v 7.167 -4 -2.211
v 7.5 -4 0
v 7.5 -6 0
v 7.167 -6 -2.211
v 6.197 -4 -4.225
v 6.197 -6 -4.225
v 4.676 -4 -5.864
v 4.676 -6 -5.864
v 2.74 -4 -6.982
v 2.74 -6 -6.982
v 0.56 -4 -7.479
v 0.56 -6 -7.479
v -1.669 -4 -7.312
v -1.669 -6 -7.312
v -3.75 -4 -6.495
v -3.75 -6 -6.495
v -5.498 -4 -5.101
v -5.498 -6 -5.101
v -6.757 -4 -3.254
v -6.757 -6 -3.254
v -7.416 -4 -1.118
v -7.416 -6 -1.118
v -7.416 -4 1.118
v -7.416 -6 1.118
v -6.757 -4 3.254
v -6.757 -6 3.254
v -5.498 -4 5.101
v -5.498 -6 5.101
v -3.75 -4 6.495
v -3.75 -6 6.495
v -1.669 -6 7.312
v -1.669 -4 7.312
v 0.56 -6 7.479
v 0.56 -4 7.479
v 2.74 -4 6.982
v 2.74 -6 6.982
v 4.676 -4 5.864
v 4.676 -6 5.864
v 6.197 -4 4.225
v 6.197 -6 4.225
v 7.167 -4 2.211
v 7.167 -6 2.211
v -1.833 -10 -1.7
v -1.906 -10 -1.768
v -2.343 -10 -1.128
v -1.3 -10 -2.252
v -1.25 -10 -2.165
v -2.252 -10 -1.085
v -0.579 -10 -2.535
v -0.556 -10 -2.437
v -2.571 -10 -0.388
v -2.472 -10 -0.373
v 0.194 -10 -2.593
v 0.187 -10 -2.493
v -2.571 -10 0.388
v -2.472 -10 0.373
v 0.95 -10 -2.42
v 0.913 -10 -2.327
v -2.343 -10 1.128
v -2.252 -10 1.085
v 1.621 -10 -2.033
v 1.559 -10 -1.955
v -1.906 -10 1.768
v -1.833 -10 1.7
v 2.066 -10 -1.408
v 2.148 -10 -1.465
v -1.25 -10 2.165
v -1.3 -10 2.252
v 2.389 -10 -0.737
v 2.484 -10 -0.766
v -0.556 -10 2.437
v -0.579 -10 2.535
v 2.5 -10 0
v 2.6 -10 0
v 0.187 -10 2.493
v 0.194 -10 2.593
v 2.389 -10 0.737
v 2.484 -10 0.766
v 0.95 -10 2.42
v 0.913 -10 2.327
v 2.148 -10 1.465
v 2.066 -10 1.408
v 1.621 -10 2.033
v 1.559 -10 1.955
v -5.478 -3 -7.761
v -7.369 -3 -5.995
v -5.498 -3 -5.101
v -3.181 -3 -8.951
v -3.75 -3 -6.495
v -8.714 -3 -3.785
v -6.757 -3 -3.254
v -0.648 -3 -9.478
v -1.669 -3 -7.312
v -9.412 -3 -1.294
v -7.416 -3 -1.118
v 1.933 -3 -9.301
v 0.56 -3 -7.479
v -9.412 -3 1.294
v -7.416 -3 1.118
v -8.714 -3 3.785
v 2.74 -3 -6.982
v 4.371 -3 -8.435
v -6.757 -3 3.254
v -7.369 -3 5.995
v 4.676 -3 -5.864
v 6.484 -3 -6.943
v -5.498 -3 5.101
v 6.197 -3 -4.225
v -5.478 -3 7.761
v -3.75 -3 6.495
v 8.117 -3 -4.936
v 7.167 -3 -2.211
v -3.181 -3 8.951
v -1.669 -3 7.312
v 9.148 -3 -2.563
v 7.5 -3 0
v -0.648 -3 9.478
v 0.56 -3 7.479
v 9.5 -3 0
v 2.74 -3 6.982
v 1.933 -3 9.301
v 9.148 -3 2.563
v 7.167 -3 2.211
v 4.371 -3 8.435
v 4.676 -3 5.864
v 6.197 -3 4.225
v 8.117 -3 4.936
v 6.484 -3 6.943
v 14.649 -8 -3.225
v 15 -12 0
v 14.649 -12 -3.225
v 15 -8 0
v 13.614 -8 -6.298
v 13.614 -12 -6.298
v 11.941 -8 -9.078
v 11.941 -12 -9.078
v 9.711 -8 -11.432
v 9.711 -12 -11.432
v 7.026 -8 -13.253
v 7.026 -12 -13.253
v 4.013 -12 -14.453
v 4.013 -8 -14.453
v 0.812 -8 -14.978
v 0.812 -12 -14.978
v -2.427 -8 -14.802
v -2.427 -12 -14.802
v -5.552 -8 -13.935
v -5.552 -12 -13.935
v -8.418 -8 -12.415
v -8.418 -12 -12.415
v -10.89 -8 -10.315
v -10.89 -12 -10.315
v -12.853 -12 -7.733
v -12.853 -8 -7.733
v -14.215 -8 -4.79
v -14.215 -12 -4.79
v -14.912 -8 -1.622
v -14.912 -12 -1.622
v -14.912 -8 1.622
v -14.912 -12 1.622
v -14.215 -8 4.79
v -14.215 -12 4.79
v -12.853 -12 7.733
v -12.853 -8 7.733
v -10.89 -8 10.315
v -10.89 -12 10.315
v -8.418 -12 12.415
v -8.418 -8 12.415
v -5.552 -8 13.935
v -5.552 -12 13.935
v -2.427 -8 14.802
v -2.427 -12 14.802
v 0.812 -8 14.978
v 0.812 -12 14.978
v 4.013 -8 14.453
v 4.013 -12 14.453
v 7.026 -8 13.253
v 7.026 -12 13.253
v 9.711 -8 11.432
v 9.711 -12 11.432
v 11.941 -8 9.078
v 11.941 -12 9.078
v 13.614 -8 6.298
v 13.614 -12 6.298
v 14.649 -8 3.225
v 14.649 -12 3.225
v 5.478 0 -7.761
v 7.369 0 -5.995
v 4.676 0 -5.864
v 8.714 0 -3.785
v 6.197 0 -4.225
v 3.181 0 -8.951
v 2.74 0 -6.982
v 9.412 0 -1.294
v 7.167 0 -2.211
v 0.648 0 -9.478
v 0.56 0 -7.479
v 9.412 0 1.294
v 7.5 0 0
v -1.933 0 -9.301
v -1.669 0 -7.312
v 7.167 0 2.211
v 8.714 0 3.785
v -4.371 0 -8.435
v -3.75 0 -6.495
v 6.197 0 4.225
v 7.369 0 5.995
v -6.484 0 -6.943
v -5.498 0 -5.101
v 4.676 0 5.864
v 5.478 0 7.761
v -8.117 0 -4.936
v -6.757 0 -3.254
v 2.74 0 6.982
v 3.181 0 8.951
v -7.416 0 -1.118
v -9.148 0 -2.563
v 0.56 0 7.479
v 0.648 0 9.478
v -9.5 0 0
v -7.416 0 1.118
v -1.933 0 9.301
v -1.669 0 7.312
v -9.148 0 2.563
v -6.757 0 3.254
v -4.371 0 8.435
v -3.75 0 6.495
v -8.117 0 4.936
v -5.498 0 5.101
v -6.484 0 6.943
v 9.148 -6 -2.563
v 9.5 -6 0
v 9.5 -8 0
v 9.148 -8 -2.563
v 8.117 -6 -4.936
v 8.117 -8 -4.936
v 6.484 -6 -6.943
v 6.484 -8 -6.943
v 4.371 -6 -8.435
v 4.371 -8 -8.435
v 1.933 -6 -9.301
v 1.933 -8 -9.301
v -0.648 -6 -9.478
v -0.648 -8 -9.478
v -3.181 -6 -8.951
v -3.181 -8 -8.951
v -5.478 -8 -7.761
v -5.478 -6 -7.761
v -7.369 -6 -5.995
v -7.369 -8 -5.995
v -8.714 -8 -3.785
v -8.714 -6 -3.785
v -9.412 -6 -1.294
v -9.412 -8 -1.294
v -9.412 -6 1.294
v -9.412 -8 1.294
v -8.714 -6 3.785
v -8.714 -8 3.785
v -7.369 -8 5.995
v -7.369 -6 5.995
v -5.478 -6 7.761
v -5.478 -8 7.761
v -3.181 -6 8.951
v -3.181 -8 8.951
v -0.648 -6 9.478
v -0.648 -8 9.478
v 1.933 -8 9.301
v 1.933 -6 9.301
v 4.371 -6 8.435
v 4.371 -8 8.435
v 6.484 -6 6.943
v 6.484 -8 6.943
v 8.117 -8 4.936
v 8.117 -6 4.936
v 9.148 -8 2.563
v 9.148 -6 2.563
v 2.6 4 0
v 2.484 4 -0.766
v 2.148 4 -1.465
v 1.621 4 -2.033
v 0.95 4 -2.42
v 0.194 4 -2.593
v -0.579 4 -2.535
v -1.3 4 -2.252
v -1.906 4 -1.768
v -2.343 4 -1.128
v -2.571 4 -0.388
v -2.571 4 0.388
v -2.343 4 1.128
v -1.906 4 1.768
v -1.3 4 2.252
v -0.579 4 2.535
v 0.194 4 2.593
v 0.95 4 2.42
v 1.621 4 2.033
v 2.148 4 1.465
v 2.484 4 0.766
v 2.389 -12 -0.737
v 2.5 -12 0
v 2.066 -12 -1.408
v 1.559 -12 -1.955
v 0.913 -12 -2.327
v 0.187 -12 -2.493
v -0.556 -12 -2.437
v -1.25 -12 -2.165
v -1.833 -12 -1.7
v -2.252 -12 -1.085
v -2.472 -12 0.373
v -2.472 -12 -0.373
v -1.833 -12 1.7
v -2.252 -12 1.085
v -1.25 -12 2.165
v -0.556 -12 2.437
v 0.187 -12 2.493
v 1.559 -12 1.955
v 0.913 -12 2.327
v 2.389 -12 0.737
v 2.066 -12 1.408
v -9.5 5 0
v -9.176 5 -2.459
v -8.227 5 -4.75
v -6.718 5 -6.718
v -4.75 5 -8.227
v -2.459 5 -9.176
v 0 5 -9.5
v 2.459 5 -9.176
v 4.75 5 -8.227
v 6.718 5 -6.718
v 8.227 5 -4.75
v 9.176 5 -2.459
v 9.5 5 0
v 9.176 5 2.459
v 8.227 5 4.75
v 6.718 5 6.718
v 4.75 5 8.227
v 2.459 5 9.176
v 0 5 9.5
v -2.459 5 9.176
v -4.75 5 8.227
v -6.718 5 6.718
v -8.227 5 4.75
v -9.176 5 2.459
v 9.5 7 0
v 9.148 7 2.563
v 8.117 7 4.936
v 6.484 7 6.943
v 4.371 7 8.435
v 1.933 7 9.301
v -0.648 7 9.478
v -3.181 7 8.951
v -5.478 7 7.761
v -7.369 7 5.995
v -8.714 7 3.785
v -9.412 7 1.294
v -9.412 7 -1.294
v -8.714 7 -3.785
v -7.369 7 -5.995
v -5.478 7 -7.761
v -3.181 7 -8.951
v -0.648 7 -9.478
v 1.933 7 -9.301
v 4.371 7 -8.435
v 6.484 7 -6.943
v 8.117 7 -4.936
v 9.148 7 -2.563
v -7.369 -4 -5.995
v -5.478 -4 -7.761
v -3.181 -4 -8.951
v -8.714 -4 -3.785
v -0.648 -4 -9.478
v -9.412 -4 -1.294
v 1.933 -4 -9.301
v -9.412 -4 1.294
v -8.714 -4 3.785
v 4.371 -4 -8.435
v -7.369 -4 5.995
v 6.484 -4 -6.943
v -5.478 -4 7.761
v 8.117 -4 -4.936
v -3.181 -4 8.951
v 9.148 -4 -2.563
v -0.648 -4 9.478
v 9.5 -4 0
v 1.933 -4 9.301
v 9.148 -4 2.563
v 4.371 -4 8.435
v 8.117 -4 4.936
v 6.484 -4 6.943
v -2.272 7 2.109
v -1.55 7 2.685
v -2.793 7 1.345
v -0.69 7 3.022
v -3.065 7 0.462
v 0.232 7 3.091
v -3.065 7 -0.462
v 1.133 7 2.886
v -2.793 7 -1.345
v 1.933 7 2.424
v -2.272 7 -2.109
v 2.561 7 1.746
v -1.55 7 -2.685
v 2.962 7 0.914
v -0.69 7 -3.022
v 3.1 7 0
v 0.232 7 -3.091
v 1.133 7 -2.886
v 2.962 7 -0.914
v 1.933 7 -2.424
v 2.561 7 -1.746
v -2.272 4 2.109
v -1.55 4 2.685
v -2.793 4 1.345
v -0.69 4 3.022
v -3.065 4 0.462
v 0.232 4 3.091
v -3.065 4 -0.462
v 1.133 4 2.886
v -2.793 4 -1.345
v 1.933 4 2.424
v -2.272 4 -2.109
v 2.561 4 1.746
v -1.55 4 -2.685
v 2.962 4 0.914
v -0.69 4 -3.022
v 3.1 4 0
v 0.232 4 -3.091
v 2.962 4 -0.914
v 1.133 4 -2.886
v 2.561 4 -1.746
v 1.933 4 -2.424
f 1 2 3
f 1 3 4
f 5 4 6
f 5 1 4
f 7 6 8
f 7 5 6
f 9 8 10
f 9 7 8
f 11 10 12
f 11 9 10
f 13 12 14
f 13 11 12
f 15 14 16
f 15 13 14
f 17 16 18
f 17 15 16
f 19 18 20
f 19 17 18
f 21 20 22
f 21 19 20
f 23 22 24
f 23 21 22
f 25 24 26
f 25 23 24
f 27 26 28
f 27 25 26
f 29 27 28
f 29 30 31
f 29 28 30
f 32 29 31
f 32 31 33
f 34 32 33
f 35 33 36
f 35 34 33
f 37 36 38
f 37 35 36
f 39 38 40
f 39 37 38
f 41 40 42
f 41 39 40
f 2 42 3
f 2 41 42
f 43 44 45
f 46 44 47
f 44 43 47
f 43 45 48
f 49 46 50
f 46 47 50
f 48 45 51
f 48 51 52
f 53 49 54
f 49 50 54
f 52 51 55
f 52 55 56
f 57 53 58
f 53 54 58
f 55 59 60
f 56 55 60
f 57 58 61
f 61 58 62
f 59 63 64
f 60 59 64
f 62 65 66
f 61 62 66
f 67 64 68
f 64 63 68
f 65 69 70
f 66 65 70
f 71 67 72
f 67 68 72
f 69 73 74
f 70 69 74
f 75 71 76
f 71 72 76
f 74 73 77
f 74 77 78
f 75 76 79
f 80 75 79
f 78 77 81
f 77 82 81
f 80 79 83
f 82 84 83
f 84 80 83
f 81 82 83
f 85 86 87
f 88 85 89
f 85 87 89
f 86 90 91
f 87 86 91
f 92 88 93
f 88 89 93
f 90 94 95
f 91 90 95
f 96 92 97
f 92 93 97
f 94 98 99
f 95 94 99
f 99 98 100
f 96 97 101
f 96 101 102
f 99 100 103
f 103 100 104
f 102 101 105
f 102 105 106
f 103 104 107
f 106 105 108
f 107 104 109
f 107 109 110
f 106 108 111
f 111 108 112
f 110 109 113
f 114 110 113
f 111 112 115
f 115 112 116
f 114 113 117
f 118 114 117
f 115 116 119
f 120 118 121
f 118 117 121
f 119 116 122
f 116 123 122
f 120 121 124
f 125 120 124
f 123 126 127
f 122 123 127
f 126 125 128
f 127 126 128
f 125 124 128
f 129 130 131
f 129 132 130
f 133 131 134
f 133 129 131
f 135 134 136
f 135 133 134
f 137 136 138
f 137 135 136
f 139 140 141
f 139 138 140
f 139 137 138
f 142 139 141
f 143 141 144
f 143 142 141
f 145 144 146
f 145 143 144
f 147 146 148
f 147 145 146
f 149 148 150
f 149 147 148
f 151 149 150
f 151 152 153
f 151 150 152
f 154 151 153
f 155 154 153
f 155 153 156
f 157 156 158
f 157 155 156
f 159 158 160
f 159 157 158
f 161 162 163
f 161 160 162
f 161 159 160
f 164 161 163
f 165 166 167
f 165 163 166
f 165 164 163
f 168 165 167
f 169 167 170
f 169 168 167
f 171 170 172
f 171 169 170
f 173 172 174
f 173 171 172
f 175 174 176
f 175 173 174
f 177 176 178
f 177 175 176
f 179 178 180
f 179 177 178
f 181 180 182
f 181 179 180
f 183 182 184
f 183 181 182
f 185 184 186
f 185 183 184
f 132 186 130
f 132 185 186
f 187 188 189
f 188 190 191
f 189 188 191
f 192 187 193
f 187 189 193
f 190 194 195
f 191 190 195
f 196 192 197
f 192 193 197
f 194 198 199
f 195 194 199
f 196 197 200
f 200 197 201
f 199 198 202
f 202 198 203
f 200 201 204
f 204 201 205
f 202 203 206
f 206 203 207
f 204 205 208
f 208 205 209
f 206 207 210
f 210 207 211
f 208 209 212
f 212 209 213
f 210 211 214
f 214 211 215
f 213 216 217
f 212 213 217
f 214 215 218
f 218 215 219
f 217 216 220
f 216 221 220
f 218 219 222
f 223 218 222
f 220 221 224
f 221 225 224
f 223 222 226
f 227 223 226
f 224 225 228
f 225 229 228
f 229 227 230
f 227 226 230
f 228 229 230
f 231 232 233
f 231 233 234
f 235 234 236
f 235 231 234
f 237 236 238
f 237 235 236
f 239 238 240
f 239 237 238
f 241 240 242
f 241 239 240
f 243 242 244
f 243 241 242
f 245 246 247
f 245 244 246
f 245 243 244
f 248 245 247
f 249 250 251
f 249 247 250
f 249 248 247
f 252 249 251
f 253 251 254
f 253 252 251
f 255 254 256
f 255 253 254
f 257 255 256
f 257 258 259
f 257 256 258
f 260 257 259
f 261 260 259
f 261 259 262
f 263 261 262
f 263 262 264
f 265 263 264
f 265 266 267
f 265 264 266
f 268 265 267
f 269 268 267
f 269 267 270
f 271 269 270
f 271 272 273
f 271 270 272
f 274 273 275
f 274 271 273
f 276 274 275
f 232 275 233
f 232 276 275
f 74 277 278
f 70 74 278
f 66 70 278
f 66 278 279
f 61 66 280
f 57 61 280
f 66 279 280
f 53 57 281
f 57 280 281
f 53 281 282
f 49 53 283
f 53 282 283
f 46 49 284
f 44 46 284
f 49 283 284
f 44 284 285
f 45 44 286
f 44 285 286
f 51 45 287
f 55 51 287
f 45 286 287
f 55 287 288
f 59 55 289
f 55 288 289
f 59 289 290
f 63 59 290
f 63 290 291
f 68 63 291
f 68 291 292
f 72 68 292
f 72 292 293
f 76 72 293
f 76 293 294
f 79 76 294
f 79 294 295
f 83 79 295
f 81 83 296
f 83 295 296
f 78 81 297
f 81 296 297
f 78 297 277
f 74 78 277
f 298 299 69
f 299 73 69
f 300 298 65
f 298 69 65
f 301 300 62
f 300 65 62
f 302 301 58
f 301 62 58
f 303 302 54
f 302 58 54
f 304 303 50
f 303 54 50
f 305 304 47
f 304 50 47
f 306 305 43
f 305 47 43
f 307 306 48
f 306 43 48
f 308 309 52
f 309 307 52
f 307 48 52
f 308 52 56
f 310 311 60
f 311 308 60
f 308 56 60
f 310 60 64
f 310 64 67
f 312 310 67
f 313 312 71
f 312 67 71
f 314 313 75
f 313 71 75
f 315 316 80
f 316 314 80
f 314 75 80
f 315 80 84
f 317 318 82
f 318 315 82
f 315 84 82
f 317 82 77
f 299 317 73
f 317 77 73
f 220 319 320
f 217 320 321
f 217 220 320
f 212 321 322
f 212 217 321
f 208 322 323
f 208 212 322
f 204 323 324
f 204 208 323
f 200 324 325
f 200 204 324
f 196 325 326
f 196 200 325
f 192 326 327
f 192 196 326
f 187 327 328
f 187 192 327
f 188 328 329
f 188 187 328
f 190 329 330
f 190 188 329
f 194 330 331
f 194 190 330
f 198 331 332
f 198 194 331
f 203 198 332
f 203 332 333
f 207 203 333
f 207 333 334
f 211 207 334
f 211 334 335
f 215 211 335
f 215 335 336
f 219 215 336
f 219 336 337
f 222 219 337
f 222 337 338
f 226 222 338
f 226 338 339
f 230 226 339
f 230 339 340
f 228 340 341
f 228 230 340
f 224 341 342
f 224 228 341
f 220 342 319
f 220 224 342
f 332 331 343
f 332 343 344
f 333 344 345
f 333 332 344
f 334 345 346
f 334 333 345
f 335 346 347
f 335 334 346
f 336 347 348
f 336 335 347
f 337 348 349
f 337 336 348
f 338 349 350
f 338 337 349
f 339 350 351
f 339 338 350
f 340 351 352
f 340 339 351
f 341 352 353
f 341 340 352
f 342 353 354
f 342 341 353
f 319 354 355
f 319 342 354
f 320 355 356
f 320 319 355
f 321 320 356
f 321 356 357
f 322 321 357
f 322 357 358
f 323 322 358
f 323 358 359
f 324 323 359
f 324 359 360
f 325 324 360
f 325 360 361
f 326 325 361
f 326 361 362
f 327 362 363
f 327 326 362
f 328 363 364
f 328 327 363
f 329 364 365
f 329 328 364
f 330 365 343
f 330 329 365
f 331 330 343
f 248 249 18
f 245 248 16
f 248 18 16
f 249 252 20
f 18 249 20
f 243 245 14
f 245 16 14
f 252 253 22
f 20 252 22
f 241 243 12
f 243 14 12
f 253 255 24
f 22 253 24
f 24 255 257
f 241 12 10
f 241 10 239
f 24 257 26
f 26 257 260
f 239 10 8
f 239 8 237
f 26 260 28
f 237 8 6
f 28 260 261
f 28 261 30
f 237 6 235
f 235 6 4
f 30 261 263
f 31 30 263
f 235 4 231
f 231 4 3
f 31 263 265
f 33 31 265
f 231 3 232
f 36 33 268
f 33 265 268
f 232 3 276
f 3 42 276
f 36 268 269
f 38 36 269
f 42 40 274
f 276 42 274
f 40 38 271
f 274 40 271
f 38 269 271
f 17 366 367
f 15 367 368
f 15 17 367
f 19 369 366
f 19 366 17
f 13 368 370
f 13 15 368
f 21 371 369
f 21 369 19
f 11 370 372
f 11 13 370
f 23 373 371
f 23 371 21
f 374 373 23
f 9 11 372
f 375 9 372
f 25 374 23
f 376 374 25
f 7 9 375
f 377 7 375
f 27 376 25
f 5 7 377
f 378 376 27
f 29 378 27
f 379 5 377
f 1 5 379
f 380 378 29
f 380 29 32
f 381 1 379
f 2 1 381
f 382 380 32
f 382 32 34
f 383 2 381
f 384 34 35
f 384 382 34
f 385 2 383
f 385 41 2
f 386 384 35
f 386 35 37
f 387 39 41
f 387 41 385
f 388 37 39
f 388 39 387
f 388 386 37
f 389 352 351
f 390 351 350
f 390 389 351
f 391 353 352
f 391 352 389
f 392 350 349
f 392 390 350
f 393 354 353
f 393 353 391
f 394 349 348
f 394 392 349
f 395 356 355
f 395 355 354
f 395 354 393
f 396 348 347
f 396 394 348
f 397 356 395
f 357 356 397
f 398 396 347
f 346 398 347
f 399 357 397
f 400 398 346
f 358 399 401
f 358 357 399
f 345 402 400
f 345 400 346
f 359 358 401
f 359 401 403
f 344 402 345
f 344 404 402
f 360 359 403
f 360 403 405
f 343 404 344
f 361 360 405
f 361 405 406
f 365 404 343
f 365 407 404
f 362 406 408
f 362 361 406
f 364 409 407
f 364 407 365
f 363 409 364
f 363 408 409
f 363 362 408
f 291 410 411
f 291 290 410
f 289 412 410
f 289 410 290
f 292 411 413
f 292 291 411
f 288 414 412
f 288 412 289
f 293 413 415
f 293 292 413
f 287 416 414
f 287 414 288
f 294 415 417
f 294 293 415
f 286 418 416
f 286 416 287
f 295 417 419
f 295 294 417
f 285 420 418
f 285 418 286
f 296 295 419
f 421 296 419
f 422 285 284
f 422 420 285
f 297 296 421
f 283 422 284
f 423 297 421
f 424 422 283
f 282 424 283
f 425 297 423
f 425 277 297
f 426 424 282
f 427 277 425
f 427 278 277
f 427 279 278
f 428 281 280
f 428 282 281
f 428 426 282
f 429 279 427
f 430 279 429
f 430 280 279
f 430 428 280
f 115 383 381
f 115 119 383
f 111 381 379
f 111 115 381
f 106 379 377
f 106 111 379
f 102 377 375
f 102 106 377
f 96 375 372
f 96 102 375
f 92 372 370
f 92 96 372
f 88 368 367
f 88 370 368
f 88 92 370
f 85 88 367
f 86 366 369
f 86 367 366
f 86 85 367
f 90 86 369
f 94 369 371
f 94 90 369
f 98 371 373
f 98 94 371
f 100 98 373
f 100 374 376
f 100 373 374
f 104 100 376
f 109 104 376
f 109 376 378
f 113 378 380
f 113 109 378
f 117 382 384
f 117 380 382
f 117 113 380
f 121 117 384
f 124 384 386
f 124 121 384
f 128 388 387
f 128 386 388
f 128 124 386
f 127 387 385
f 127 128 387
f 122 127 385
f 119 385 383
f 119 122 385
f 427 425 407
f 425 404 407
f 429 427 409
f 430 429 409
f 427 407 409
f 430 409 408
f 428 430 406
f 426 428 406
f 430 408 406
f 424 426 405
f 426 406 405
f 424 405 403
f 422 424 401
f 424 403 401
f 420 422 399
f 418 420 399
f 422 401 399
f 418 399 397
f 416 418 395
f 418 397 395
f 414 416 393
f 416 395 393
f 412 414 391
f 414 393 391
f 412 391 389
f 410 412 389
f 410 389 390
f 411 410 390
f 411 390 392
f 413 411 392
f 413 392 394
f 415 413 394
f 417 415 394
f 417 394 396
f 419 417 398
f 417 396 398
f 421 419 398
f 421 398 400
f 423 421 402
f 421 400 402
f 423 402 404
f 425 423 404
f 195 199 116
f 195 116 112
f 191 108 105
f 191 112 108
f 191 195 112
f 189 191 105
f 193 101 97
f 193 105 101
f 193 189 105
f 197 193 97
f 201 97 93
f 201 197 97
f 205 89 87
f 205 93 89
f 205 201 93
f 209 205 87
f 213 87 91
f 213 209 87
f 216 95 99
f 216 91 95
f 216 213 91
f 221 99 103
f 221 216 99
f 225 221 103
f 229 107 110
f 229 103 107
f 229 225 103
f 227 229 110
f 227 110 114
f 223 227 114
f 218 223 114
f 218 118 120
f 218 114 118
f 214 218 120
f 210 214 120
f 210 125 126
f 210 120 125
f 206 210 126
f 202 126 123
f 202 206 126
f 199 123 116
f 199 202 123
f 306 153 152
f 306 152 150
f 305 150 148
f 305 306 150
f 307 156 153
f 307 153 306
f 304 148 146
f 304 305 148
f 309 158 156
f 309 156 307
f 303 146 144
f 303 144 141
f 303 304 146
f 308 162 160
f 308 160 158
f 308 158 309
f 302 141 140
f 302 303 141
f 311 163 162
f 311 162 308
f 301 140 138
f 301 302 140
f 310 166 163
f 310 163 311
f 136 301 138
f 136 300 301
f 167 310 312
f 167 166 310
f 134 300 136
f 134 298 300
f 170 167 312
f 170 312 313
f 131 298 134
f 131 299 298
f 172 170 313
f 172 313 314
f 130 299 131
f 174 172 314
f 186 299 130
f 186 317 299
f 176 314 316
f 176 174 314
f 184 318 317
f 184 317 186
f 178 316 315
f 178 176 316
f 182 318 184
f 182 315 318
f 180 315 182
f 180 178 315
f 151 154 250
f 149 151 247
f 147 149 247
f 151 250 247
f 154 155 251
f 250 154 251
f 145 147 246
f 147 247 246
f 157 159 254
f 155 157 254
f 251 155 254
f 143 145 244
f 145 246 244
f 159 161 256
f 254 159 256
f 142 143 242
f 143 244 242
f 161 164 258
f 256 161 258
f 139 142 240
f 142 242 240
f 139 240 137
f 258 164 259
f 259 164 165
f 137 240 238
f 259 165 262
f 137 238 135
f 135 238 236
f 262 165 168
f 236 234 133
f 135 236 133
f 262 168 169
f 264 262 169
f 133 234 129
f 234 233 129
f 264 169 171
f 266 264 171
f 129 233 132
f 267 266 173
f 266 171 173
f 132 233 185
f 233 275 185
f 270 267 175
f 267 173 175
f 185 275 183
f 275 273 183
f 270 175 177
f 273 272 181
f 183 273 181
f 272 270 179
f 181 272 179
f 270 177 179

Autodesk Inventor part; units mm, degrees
sketch "Эскиз1" plane through (0, 0, 0) normal (0, 1, 0) x (-1, 0, 0)
  circle A0 centre (0, 0) radius 9.5
  dimension "d0" = 19
extrude "Выдавливание1" add sketch "Эскиз1" along normal blind 5
sketch "Эскиз2" plane through (0, 0, 0) normal (0, -1, 0) x (1, 0, 0)
  circle A0 centre (0, 0) radius 7.5
  dimension "d3" = 15
extrude "Выдавливание2" add sketch "Эскиз2" along normal blind 3
sketch "Эскиз3" plane through (0, -3, 0) normal (0, -1, 0) x (1, 0, 0)
  circle A0 centre (0, 0) radius 9.5
  dimension "d15" = 19
extrude "Выдавливание3" add sketch "Эскиз3" along normal blind 1
sketch "Эскиз4" plane through (0, -4, 0) normal (0, -1, 0) x (1, 0, 0)
  circle A0 centre (0, 0) radius 7.5
  dimension "d17" = 15
extrude "Выдавливание4" add sketch "Эскиз4" along normal blind 2
sketch "Эскиз5" plane through (0, -6, 0) normal (0, -1, 0) x (1, 0, 0)
  circle A0 centre (0, 0) radius 9.5
  dimension "d16" = 19
extrude "Выдавливание5" add sketch "Эскиз5" along normal blind 2
sketch "Эскиз8" plane through (0, -8, 0) normal (0, -1, 0) x (1, 0, 0)
  circle A0 centre (0, 0) radius 15
  dimension "d21" = 30
extrude "Выдавливание8" add sketch "Эскиз8" along normal blind 2
sketch "Эскиз6" plane through (0, 5, 0) normal (0, 1, 0) x (1, 0, 0)
  circle A0 centre (0, 0) radius 2.6
  dimension "d12" = 5.2
extrude "Выдавливание6" cut sketch "Эскиз6" against normal blind 27
sketch "Эскиз10" plane through (0, -10, 0) normal (0, -1, 0) x (1, 0, 0)
  circle A0 centre (0, 0) radius 15 projected
  circle A1 centre (0, 0) radius 15
  circle A2 centre (0, 0) radius 2.5 projected
  circle A3 centre (0, 0) radius 2.5
ref_plane "РабПлоскость1" through (-11.6426, -12, -11.6426) normal (0, -1, 0) x (1, 0, 0)
extrude "Выдавливание10" add sketch "Эскиз10" along normal up to surface (2 mm away)
sketch "Эскиз11" plane through (0, -12, 0) normal (0, -1, 0) x (1, 0, 0)
  circle A0 centre (0, 0) radius 5 projected
  circle A1 centre (0, 0) radius 5
  circle A2 centre (0, 0) radius 2.7
  point P0 (0, 0)
  dimension "d38" = 5.4
ref_plane "РабПлоскость2" through (-5.2921, -22, -5.2921) normal (0, -1, 0) x (1, 0, 0)
sketch "Эскиз13" plane through (0, 5, 0) normal (0, 1, 0) x (1, 0, 0)
  circle A0 centre (0, 0) radius 9.5
ref_plane "РабПлоскость3" through (-15.9179, 7, -15.9179) normal (0, 1, 0) x (0.0632, 0, 0.998)
extrude "Выдавливание14" add sketch "Эскиз13" along normal up to surface (2 mm away)
sketch "Эскиз14" plane through (0, 7, 0) normal (0, 1, 0) x (1, 0, 0)
  circle A0 centre (0, 0) radius 3.1
  dimension "d48" = 6.2
extrude "Выдавливание15" cut sketch "Эскиз14" against normal blind 3
properties part number "диск"
